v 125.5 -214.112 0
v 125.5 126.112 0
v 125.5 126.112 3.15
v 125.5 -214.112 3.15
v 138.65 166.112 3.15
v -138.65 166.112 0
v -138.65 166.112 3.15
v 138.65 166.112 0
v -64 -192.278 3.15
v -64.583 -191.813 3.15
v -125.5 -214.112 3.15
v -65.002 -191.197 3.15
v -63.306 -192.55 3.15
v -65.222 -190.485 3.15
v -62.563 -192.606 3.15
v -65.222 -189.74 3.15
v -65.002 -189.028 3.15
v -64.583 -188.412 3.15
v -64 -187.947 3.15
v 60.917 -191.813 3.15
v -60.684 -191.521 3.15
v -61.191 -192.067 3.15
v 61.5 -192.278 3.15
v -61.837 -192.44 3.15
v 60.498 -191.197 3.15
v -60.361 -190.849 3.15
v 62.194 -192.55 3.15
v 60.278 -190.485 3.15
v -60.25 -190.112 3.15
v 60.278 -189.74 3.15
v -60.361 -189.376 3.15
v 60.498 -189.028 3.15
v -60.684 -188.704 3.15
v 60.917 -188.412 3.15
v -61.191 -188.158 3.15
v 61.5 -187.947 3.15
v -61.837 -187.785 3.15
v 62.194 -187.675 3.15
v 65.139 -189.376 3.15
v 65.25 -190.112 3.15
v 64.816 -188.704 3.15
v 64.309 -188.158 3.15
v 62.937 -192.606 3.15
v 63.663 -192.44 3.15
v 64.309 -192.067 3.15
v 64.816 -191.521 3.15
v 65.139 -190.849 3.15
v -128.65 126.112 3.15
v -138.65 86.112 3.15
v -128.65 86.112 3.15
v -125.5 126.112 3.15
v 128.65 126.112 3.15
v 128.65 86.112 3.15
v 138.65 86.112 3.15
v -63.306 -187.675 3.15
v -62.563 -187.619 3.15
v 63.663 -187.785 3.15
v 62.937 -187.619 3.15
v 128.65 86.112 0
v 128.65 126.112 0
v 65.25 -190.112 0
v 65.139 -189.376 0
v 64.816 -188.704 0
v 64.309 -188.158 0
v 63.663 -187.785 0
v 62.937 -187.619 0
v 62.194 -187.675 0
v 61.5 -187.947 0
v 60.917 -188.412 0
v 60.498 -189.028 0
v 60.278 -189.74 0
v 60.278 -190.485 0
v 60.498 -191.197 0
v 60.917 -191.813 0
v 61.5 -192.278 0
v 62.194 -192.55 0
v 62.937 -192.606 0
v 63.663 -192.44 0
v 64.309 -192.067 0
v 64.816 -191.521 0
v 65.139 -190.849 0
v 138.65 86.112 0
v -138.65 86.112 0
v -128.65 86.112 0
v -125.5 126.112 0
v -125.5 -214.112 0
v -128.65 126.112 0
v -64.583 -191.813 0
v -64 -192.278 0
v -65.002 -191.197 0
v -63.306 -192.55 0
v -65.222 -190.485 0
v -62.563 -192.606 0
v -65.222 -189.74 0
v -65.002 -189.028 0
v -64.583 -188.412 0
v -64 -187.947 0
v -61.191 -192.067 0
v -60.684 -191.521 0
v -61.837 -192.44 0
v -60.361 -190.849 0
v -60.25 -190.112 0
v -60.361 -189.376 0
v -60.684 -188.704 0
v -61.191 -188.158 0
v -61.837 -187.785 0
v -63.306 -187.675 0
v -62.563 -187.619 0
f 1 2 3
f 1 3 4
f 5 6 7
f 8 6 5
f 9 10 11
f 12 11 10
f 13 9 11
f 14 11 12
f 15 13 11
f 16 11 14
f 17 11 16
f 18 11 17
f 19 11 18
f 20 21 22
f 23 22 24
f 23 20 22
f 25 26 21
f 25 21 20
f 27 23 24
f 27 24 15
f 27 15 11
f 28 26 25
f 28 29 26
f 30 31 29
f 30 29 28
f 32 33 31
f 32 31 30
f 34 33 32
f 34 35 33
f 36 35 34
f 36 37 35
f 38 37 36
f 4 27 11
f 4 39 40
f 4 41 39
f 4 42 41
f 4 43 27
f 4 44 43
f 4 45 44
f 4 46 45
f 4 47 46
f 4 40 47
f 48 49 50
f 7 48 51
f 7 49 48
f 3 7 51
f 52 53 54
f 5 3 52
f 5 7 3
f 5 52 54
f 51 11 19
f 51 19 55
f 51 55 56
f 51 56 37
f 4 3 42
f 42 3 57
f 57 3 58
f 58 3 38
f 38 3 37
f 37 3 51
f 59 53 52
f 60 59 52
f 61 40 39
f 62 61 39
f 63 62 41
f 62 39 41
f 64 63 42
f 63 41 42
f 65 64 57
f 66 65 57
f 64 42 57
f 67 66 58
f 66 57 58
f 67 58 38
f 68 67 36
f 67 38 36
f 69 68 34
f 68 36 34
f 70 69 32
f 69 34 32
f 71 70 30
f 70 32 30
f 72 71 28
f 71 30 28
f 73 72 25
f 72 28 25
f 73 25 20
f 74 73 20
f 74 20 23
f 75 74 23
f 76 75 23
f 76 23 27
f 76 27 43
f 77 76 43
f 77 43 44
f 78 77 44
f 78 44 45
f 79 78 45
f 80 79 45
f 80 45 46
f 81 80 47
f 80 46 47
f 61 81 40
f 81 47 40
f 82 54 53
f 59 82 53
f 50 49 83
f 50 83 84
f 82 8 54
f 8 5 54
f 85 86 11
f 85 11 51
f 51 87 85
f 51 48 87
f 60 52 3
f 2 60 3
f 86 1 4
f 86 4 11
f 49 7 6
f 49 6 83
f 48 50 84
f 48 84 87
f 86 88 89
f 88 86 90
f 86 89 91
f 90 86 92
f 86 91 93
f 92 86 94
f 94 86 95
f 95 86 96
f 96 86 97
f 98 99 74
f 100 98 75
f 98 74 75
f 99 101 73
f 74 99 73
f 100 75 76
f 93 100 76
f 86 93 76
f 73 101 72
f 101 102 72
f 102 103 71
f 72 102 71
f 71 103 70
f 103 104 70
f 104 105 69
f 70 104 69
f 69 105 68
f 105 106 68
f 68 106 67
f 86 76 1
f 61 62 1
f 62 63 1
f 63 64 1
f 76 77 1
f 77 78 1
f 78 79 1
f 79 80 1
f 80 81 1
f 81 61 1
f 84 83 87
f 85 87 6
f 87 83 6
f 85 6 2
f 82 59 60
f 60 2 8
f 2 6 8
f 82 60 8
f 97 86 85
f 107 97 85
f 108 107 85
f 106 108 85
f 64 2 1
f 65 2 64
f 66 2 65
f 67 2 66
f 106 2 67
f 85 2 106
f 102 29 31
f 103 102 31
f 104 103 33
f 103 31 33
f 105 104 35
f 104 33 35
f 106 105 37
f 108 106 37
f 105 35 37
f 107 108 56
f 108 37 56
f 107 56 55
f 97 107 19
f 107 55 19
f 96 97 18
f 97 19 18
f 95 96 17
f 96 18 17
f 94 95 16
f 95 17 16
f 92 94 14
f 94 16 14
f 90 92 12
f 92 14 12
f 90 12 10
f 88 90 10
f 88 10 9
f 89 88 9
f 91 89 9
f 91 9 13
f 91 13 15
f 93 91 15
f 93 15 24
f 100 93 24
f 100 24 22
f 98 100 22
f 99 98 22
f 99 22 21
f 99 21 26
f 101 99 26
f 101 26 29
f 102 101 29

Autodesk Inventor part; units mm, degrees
ref_plane "YZ Plane" through (0, 0, 0) normal (1, 0, 0) x (0, 1, 0)
ref_plane "XZ Plane" through (0, 0, 0) normal (0, 1, 0) x (-1, 0, 0)
ref_plane "XY Plane" through (0, 0, 0) normal (0, 0, 1) x (1, 0, 0)
sketch "Sketch1" plane through (0, 0, 0) normal (0, 0, 1) x (1, 0, 0)
  line L0 (125.5, -166.1125) -> (-125.5, -166.1125)
  line L1 (-125.5, -166.1125) -> (-125.5, 166.1125)
  line L2 (-125.5, 166.1125) -> (125.5, 166.1125)
  line L3 (125.5, 166.1125) -> (125.5, -166.1125)
  line L4 (125.5, -166.1125) -> (-125.5, 166.1125) construction
  line L5 (-125.5, -166.1125) -> (125.5, 166.1125) construction
  line L6 (-125.5, -166.1125) -> (125.5, -166.1125)
  line L7 (125.5, -166.1125) -> (125.5, -214.1125)
  line L8 (125.5, -214.1125) -> (-125.5, -214.1125)
  line L9 (-125.5, -214.1125) -> (-125.5, -166.1125)
  point P0 (0, 0)
  dimension "d0" = 251
  dimension "d1" = 332.225
  dimension "d4" = 48
  dimension "d5" = 0
  dimension "d6" = 0
extrude "Extrusion1" add sketch "Sketch1" along normal blind 3.15
sketch "Sketch2" plane through (0, 0, 3.15) normal (0, 0, 1) x (1, 0, 0)
  line L0 (125.5, 166.1125) -> (-125.5, 166.1125) projected
  line L1 (-125.5, 166.1125) -> (-138.65, 166.1125)
  line L2 (-138.65, 166.1125) -> (-138.65, 86.1125)
  line L3 (-138.65, 86.1125) -> (-125.5, 86.1125)
  line L4 (-125.5, 86.1125) -> (-125.5, 166.1125)
  line L5 (-125.5, 86.1125) -> (-128.65, 86.1125)
  line L6 (-128.65, 86.1125) -> (-128.65, 126.1125)
  line L7 (-128.65, 126.1125) -> (-125.5, 126.1125)
  line L8 (-125.5, 126.1125) -> (-125.5, 86.1125)
  line L9 (0, 166.1125) -> (0, 0)
  line L10 (125.5, 166.1125) -> (138.65, 166.1125)
  line L11 (138.65, 166.1125) -> (138.65, 86.1125)
  line L12 (138.65, 86.1125) -> (125.5, 86.1125)
  line L13 (125.5, 86.1125) -> (125.5, 166.1125)
  line L14 (125.5, 86.1125) -> (128.65, 86.1125)
  line L15 (128.65, 86.1125) -> (128.65, 126.1125)
  line L16 (128.65, 126.1125) -> (125.5, 126.1125)
  line L17 (125.5, 126.1125) -> (125.5, 86.1125)
  dimension "d7" = 80
  dimension "d8" = 13.15
  dimension "d9" = 3.15
  dimension "d10" = 40
extrude "Extrusion2" add sketch "Sketch2" against normal blind 3.15 contours L4 L7 L6 L3 L2 L1 | L10 L11 L12 L15 L16 L13
sketch "Sketch3" plane through (0, 0, 3.15) normal (0, 0, 1) x (1, 0, 0)
  line L0 (-125.5, -214.1125) -> (125.5, -214.1125) projected
  circle A0 centre (-62.75, -190.1125) radius 2.5
  line L1 (0, 0) -> (0, -214.1125)
  circle A1 centre (62.75, -190.1125) radius 2.5
  dimension "d13" = 5
  dimension "d14" = 24
  dimension "d15" = 62.75
extrude "Extrusion3" cut sketch "Sketch3" against normal blind 10
equation "\"d0\" = door_x"
equation "\"d1\" = door_z"
equation "\"d4\" = door_overlap"
equation "\"d2\" = clear_acrylic"
equation "\"d7\" = protection_slot_length"
equation "\"d8\" = protection_slot_width + clear_acrylic"
equation "\"d9\" = clear_acrylic"
equation "\"d10\" = 0.5 * protection_slot_length"
equation "\"d11\" = clear_acrylic"
equation "\"d13\" = m5_diameter"
equation "\"d14\" = 0.5 * door_overlap"
equation "\"d15\" = 0.25 * tray_x"
equation "\"sm_thickness\" = 1.5875"
equation "\"very_thick_acrylic\" = 9.45"
equation "\"thick_acrylic\" = 5.88"
equation "\"thin_acrylic\" = 3.15"
equation "\"clear_acrylic\" = 3.15"
equation "\"wood_thickness\" = 6.72"
equation "\"m3_diameter\" = 3"
equation "\"m4_diameter\" = 4"
equation "\"m5_diameter\" = 5"
equation "\"brass_insert_drill\" = 4"
equation "\"m5_brass_insert_drill\" = 6.7"
equation "\"m3_main_length\" = 14"
equation "\"m3_main_nut_width\" = 5.7"
equation "\"m3_main_nut_thickness\" = 2.5"
equation "\"m3_main_extra\" = 1"
equation "\"stepper_screw_space\" = 35"
equation "\"stepper_shaft_diameter\" = 5"
equation "\"stepper_body_diameter\" = 28"
equation "\"laser_body_diameter\" = 12"
equation "\"carrier_y\" = 251"
equation "\"carrier_z\" = 12"
equation "\"visor_x\" = 253.925"
equation "\"visor_y\" = 85.6"
equation "\"protection_slot\" = 44.2"
equation "\"protection_slot_offset\" = 55.25"
equation "\"protection_slot_length\" = 80"
equation "\"window_z\" = 332.225"
equation "\"window_y\" = 93.75"
equation "\"window_overlap\" = 48"
equation "\"door_x\" = 251"
equation "\"door_z\" = 332.225"
equation "\"door_sensor\" = 35"
equation "\"reservoir_x\" = 201"
equation "\"reservoir_y\" = 201"
equation "\"linear_bearing_spacing\" = 271"
equation "\"motor_spacing\" = 337"
equation "\"tray_border\" = 25"
equation "\"tray_x\" = 251"
equation "\"tray_y\" = 251"
equation "\"bed_z\" = 25"
equation "\"crane_z2\" = 12"
equation "\"end_stop_spacing\" = 19"
equation "\"door_overlap\" = 48"
equation "\"acrylic_into_frame\" = 5"
equation "\"protection_slot_width\" = 10"
equation "\"frame_top_z\" = 385"
equation "\"nema17_x\" = 43"
equation "\"drawer_z_from_bottom\" = 25"
equation "\"laser_diameter\" = 12"
equation "\"t_galvo_frame\" = 6.72"
equation "\"laser_z\" = 75"
equation "\"drawer_y\" = 90.3375"
equation "\"laser_y\" = 15"
equation "\"subframe_x\" = 66"
equation "\"galvo_frame_z\" = 85"
equation "\"subframe_y_offset\" = 27.5"
equation "\"drawer_x\" = 257.3"
equation "\"printer_z\" = 289"
equation "\"lcd_x\" = 72"
equation "\"frame_tilt\" = 1deg"
equation "\"frame_foot_z\" = 12"
equation "\"frame_border\" = 48.0375"
equation "\"frame_bottom_z\" = 275"
equation "\"z_min_from_center\" = 115"
equation "\"thumb_nut_diameter\" = 7"
equation "\"laser_z_offset\" = 55"
equation "\"laser_y_offset\" = 19.4"
equation "\"thumb_nut_offset_y\" = 0"
equation "\"galvo_frame_y_offset\" = 27.5"
equation "\"frame_total_z\" = 661.5875"
equation "\"galvo_frame_x\" = 66"
equation "\"drawer_z\" = 278.175"
equation "\"lcd_y\" = 25"
equation "\"m3_press_nut_drill\" = 4.5"
equation "\"m3_head\" = 6"
equation "\"m5_head\" = 10.3"
equation "\"m5_press_nut_drill\" = 6.5"
equation "\"drawer_support_from_top\" = 48"
equation "\"laser_gap\" = 1"
equation "\"frame_screw_from_center\" = 25"
equation "\"drawer_screw_from_center\" = 55"
equation "\"frame_face_y\" = 45"
equation "\"switch_spacing\" = 19"
equation "\"subframe_y\" = 55"
equation "\"al_thickness\" = 1.5875"
equation "\"rivet_diameter\" = 3.3"
equation "\"bend_factor\" = 2.26205"
equation "\"al_bend\" = 3.591"
equation "\"sm_bend\" = 3.591"
equation "\"frame_x\" = 353.375"
equation "\"carrier_z2\" = 25"
equation "\"carrier_y2\" = 76.825"
properties part number "door"
